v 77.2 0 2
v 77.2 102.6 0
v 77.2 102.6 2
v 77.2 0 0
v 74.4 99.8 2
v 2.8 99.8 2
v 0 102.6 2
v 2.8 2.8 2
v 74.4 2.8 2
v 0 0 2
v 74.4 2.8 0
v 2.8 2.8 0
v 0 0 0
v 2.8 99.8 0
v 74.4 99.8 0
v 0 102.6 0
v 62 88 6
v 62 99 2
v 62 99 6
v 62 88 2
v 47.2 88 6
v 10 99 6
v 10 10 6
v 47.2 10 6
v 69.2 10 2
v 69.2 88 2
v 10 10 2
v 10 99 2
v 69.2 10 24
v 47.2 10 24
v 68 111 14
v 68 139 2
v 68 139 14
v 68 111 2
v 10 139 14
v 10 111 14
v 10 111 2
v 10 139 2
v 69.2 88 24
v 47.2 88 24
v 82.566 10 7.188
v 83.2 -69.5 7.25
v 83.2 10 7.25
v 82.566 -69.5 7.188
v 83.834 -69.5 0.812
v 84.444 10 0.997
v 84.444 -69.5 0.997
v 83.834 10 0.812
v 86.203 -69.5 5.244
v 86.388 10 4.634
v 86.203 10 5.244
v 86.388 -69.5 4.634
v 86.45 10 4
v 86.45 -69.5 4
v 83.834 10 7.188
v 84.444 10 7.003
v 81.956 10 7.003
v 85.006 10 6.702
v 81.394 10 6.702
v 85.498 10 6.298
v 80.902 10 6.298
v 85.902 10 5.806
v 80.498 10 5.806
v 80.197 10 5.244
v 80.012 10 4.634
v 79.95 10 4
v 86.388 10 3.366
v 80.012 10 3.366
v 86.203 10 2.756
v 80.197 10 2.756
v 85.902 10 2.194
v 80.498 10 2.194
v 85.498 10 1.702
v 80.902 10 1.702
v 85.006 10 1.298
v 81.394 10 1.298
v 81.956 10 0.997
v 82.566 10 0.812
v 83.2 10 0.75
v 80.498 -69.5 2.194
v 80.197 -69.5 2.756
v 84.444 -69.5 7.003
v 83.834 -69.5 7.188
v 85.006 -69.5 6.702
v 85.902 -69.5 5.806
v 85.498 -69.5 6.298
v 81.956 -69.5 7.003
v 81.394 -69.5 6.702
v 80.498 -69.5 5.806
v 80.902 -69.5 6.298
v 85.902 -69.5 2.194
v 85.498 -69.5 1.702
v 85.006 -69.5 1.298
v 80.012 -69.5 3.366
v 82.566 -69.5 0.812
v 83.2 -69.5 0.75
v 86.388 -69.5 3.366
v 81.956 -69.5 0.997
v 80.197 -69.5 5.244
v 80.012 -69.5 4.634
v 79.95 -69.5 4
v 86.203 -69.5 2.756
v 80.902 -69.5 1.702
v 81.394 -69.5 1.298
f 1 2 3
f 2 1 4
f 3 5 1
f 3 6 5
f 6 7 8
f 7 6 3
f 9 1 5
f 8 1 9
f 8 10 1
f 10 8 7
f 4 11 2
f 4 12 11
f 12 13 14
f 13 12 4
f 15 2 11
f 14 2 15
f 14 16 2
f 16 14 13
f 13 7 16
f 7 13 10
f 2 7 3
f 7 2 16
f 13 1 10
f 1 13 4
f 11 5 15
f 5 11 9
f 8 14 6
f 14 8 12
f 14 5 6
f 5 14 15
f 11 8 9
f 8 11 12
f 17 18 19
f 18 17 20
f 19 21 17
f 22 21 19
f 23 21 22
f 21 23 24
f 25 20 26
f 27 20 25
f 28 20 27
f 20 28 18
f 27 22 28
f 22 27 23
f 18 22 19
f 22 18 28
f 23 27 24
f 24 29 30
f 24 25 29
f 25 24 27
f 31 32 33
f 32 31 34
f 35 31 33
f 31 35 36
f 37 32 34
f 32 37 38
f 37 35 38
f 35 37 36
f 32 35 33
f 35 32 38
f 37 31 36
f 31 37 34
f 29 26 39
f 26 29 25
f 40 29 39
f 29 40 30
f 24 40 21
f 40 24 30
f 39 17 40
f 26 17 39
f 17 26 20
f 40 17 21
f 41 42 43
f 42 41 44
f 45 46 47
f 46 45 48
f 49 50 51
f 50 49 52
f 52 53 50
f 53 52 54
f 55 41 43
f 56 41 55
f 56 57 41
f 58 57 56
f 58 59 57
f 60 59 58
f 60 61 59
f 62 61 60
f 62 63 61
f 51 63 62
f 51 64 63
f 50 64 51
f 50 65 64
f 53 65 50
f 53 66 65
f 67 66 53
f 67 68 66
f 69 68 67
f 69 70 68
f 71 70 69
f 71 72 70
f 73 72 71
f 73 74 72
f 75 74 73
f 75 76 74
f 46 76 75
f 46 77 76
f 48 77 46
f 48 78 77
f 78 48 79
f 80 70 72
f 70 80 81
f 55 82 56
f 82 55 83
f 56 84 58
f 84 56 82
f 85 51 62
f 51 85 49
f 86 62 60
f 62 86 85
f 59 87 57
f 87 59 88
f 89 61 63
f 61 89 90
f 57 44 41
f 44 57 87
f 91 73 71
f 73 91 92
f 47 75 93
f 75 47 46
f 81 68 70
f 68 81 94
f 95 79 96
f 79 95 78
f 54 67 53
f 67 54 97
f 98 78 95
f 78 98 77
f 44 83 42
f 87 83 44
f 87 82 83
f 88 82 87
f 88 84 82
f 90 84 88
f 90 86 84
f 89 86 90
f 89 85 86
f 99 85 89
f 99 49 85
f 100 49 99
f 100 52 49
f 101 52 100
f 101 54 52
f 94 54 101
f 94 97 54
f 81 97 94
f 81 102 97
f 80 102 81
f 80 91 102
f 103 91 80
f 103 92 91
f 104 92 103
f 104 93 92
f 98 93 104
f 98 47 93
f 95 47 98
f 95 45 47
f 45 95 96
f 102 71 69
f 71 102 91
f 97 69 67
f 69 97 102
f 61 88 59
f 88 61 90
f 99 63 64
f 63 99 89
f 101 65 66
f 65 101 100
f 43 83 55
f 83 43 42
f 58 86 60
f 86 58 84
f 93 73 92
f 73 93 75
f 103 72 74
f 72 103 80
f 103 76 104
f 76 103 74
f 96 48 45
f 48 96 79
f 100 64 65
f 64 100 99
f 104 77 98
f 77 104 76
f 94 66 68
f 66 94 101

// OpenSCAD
// file: rugged_a.scad
// Pablo Hacker / BruceButBetter — Rugged A parametric enclosure
// STATUS: PARAMETRIC PROTOTYPE; PHOTO_ESTIMATE values are not mounting-verified.
// Set dimensions from caliper measurements before exporting STL.

variant = "A1"; // "A1" touch-only or "A2" optional BACK/SELECT provisions

// ---------------- PHOTO_ESTIMATE / MEASURE_REQUIRED ----------------
// Based on the supplied mat photographs; do not use for final mounting.
tft_w = 52.0;          // PHOTO_ESTIMATE: red PCB outer width, observed ~50–54
tft_h = 89.0;          // PHOTO_ESTIMATE: red PCB outer height, observed ~88–90
tft_t = 4.0;           // MEASURE_REQUIRED: PCB/display stack thickness
tft_window_w = 43.0;  // PHOTO_ESTIMATE: active window only; verify bezel/offset
tft_window_h = 70.0;  // PHOTO_ESTIMATE: active window only; verify bezel/offset
tft_hole_d = 3.2;      // MEASURE_REQUIRED: mounting hole diameter
tft_hole_x = 5.0;      // MEASURE_REQUIRED: transverse hole-center inset
tft_hole_y = 4.25;     // PHOTO_ESTIMATE: longitudinal inset; verify each hole
tft_hole_spacing_y = 80.5; // PHOTO_ESTIMATE: longitudinal center spacing ~79–82

// Reference envelope from espboards.dev; verify against the user's V1.4 board
// before final export. Source: https://www.espboards.dev/esp32/yd-esp32-s3/
esp_w = 58.0;          // PHOTO_ESTIMATE: observed ~57–59; reference was 57.15
esp_h = 28.0;          // PHOTO_ESTIMATE: observed ~28; reference was 27.94
esp_pitch = 2.54;      // VERIFIED REFERENCE: header pitch (mm)
esp_t = 12.0;          // MEASURE_REQUIRED: tallest component
usb_x = 8.0;           // MEASURE_REQUIRED: USB-C center offset
usb_z = 8.0;           // MEASURE_REQUIRED: USB-C height
usb_orientation = "SAME_END_PHOTO_ESTIMATE"; // verify connector side/orientation
usb_center_spacing = 9.0; // MEASURE_REQUIRED: spacing between connector centers
usb_slot_w = 10.0;     // MEASURE_REQUIRED: plug opening width
usb_slot_h = 6.0;      // MEASURE_REQUIRED: plug opening height

batt_w = 22.0;         // MEASURE_REQUIRED: protected 18650 holder width
batt_l = 78.0;         // MEASURE_REQUIRED: holder length
batt_h = 22.0;         // MEASURE_REQUIRED: holder height
stylus_d = 6.5;        // PHOTO_ESTIMATE: max diameter ~6–7
stylus_l = 79.5;       // PHOTO_ESTIMATE: length ~79–80
stylus_tip_d = 3.5;    // MEASURE_REQUIRED: tapered tip diameter
stylus_clip_w = 2.0;   // design parameter; verify fit against actual clip

// Design allowances, adjustable after measurements.
wall = 2.8;
clearance = 1.2;
corner_r = 7;
front_lip = 2.0;
depth = 34.0;           // MEASURE_REQUIRED after stack-up and battery layout

case_w = max(tft_w, esp_w + 2*wall) + 2*wall + 8;
case_h = max(tft_h, batt_l) + 2*wall + 8;

module_t = tft_t + clearance;

module module_holes() {
    for (x=[tft_hole_x, tft_w-tft_hole_x])
        for (y=[tft_hole_y, tft_hole_y+tft_hole_spacing_y])
            translate([x,y,-1]) cylinder(d=tft_hole_d+0.5,h=depth+2,$fn=32);
}

module rounded_box(w,h,d,r) {
    hull() {
        for (x=[r,w-r]) for (y=[r,h-r])
            translate([x,y,0]) cylinder(r=r,h=d,$fn=32);
    }
}

module front_shell() {
    difference() {
        rounded_box(case_w, case_h, depth, corner_r);
        // TFT opening: placeholder position until active-window offsets are measured.
        translate([(case_w-tft_window_w)/2, case_h-tft_window_h-7, depth-3])
            cube([tft_window_w,tft_window_h,6]);
        // Four TFT mounting hole channels, shown as a common mounting pattern placeholder.
        translate([(case_w-tft_w)/2, case_h-tft_h-4, 0]) module_holes();
        // Both USB-C openings are provisioned on one short end according to the
        // photo orientation; center spacing and exact height remain measured inputs.
        translate([(case_w-usb_center_spacing)/2-usb_slot_w/2, -1, usb_z])
            cube([usb_slot_w, wall+2, usb_slot_h]);
        translate([(case_w+usb_center_spacing)/2-usb_slot_w/2, -1, usb_z])
            cube([usb_slot_w, wall+2, usb_slot_h]);
        // Bottom header and microSD access are kept as service clearances.
        translate([(case_w-32)/2, case_h-tft_h-2, -1]) cube([32, 7, depth+2]);
        translate([case_w-20, case_h/2-15, depth-4]) cube([18, 30, 6]);
        // Battery bay access volume.
        translate([(case_w-batt_w)/2, 5, wall]) cube([batt_w+2*clearance,batt_l+2*clearance,batt_h+2*clearance]);
    }
}

module back_cover() {
    difference() {
        rounded_box(case_w, case_h, 4, corner_r);
        // Ventilation and cable relief are intentionally conservative placeholders.
        for (x=[case_w/2-12,case_w/2+12]) translate([x,8,-1]) cylinder(d=4,h=6,$fn=24);
    }
}

module stylus_holder() {
    difference() {
        // Thick cradle for a tapered stylus, with a flexible-looking retaining
        // clip geometry. Dimensions are estimates until the real stylus is measured.
        translate([case_w+4, 12, 4]) cube([stylus_d+6, stylus_l+5, stylus_d+9]);
        translate([case_w+7, 14, 7])
            hull() {
                cylinder(d=stylus_d+0.8,h=stylus_l+2,$fn=32);
                translate([0,stylus_l,0]) cylinder(d=stylus_tip_d+0.8,h=stylus_l+2,$fn=32);
            }
        // Open slot and clip clearance; avoids a brittle closed cylinder.
        translate([case_w+4, stylus_l/2+12, stylus_d+4]) cube([stylus_d+6, 3, 7]);
    }
    translate([case_w+4, 12+stylus_l-8, stylus_d+10]) cube([stylus_d+6, 8, 2]);
}

module button_provisions() {
    if (variant == "A2") {
        // Mechanical provisions only. GPIO assignment is intentionally absent.
        for (y=[case_h/2-10, case_h/2+10])
            translate([case_w/2-6,y,-1]) cylinder(d=8,h=6,$fn=32);
    }
}

// Exploded layout preview: move covers and cradle for inspection.
front_shell();
translate([case_w+18,0,0]) back_cover();
translate([case_w+18,case_h+12,0]) stylus_holder();
button_provisions();
// main file
// Rugged A1 placement preview only; not a printable enclosure.
// Uses the same PHOTO_ESTIMATE parameters as rugged_a.scad.
use <rugged_a.scad>;

// OpenSCAD `use` imports modules but not top-level variables; keep this
// preview explicitly synchronized with rugged_a.scad's current parameters.
tft_w = 52.0; tft_h = 89.0; tft_t = 4.0;
esp_w = 58.0; esp_h = 28.0; esp_t = 12.0;
batt_w = 22.0; batt_l = 78.0; batt_h = 22.0;
stylus_d = 6.5; stylus_l = 79.5;
wall = 2.8; case_w = max(tft_w, esp_w + 2*wall) + 2*wall + 8;
case_h = max(tft_h, batt_l) + 2*wall + 8;

// The components are deliberately separate colored solids so the placement
// and remaining measurement assumptions are visible in the render.
color("#8b0000") translate([10, 10, 2]) cube([tft_w, tft_h, tft_t]);
color("#202020") translate([10, tft_h + 22, 2]) cube([esp_w, esp_h, esp_t]);
color("#303030") translate([case_w - batt_w - 8, 10, 2]) cube([batt_w, batt_l, batt_h]);
color("#39FF14") translate([case_w + 6, 10, 4])
    rotate([90,0,0]) cylinder(d=stylus_d, h=stylus_l, $fn=32);

// Reference outline only; it is not exported as a final case.
color([0.1,0.1,0.1,0.18]) translate([0,0,0])
    difference() {
        cube([case_w, case_h, 2]);
        translate([wall,wall,-1]) cube([case_w-2*wall,case_h-2*wall,4]);
    }
